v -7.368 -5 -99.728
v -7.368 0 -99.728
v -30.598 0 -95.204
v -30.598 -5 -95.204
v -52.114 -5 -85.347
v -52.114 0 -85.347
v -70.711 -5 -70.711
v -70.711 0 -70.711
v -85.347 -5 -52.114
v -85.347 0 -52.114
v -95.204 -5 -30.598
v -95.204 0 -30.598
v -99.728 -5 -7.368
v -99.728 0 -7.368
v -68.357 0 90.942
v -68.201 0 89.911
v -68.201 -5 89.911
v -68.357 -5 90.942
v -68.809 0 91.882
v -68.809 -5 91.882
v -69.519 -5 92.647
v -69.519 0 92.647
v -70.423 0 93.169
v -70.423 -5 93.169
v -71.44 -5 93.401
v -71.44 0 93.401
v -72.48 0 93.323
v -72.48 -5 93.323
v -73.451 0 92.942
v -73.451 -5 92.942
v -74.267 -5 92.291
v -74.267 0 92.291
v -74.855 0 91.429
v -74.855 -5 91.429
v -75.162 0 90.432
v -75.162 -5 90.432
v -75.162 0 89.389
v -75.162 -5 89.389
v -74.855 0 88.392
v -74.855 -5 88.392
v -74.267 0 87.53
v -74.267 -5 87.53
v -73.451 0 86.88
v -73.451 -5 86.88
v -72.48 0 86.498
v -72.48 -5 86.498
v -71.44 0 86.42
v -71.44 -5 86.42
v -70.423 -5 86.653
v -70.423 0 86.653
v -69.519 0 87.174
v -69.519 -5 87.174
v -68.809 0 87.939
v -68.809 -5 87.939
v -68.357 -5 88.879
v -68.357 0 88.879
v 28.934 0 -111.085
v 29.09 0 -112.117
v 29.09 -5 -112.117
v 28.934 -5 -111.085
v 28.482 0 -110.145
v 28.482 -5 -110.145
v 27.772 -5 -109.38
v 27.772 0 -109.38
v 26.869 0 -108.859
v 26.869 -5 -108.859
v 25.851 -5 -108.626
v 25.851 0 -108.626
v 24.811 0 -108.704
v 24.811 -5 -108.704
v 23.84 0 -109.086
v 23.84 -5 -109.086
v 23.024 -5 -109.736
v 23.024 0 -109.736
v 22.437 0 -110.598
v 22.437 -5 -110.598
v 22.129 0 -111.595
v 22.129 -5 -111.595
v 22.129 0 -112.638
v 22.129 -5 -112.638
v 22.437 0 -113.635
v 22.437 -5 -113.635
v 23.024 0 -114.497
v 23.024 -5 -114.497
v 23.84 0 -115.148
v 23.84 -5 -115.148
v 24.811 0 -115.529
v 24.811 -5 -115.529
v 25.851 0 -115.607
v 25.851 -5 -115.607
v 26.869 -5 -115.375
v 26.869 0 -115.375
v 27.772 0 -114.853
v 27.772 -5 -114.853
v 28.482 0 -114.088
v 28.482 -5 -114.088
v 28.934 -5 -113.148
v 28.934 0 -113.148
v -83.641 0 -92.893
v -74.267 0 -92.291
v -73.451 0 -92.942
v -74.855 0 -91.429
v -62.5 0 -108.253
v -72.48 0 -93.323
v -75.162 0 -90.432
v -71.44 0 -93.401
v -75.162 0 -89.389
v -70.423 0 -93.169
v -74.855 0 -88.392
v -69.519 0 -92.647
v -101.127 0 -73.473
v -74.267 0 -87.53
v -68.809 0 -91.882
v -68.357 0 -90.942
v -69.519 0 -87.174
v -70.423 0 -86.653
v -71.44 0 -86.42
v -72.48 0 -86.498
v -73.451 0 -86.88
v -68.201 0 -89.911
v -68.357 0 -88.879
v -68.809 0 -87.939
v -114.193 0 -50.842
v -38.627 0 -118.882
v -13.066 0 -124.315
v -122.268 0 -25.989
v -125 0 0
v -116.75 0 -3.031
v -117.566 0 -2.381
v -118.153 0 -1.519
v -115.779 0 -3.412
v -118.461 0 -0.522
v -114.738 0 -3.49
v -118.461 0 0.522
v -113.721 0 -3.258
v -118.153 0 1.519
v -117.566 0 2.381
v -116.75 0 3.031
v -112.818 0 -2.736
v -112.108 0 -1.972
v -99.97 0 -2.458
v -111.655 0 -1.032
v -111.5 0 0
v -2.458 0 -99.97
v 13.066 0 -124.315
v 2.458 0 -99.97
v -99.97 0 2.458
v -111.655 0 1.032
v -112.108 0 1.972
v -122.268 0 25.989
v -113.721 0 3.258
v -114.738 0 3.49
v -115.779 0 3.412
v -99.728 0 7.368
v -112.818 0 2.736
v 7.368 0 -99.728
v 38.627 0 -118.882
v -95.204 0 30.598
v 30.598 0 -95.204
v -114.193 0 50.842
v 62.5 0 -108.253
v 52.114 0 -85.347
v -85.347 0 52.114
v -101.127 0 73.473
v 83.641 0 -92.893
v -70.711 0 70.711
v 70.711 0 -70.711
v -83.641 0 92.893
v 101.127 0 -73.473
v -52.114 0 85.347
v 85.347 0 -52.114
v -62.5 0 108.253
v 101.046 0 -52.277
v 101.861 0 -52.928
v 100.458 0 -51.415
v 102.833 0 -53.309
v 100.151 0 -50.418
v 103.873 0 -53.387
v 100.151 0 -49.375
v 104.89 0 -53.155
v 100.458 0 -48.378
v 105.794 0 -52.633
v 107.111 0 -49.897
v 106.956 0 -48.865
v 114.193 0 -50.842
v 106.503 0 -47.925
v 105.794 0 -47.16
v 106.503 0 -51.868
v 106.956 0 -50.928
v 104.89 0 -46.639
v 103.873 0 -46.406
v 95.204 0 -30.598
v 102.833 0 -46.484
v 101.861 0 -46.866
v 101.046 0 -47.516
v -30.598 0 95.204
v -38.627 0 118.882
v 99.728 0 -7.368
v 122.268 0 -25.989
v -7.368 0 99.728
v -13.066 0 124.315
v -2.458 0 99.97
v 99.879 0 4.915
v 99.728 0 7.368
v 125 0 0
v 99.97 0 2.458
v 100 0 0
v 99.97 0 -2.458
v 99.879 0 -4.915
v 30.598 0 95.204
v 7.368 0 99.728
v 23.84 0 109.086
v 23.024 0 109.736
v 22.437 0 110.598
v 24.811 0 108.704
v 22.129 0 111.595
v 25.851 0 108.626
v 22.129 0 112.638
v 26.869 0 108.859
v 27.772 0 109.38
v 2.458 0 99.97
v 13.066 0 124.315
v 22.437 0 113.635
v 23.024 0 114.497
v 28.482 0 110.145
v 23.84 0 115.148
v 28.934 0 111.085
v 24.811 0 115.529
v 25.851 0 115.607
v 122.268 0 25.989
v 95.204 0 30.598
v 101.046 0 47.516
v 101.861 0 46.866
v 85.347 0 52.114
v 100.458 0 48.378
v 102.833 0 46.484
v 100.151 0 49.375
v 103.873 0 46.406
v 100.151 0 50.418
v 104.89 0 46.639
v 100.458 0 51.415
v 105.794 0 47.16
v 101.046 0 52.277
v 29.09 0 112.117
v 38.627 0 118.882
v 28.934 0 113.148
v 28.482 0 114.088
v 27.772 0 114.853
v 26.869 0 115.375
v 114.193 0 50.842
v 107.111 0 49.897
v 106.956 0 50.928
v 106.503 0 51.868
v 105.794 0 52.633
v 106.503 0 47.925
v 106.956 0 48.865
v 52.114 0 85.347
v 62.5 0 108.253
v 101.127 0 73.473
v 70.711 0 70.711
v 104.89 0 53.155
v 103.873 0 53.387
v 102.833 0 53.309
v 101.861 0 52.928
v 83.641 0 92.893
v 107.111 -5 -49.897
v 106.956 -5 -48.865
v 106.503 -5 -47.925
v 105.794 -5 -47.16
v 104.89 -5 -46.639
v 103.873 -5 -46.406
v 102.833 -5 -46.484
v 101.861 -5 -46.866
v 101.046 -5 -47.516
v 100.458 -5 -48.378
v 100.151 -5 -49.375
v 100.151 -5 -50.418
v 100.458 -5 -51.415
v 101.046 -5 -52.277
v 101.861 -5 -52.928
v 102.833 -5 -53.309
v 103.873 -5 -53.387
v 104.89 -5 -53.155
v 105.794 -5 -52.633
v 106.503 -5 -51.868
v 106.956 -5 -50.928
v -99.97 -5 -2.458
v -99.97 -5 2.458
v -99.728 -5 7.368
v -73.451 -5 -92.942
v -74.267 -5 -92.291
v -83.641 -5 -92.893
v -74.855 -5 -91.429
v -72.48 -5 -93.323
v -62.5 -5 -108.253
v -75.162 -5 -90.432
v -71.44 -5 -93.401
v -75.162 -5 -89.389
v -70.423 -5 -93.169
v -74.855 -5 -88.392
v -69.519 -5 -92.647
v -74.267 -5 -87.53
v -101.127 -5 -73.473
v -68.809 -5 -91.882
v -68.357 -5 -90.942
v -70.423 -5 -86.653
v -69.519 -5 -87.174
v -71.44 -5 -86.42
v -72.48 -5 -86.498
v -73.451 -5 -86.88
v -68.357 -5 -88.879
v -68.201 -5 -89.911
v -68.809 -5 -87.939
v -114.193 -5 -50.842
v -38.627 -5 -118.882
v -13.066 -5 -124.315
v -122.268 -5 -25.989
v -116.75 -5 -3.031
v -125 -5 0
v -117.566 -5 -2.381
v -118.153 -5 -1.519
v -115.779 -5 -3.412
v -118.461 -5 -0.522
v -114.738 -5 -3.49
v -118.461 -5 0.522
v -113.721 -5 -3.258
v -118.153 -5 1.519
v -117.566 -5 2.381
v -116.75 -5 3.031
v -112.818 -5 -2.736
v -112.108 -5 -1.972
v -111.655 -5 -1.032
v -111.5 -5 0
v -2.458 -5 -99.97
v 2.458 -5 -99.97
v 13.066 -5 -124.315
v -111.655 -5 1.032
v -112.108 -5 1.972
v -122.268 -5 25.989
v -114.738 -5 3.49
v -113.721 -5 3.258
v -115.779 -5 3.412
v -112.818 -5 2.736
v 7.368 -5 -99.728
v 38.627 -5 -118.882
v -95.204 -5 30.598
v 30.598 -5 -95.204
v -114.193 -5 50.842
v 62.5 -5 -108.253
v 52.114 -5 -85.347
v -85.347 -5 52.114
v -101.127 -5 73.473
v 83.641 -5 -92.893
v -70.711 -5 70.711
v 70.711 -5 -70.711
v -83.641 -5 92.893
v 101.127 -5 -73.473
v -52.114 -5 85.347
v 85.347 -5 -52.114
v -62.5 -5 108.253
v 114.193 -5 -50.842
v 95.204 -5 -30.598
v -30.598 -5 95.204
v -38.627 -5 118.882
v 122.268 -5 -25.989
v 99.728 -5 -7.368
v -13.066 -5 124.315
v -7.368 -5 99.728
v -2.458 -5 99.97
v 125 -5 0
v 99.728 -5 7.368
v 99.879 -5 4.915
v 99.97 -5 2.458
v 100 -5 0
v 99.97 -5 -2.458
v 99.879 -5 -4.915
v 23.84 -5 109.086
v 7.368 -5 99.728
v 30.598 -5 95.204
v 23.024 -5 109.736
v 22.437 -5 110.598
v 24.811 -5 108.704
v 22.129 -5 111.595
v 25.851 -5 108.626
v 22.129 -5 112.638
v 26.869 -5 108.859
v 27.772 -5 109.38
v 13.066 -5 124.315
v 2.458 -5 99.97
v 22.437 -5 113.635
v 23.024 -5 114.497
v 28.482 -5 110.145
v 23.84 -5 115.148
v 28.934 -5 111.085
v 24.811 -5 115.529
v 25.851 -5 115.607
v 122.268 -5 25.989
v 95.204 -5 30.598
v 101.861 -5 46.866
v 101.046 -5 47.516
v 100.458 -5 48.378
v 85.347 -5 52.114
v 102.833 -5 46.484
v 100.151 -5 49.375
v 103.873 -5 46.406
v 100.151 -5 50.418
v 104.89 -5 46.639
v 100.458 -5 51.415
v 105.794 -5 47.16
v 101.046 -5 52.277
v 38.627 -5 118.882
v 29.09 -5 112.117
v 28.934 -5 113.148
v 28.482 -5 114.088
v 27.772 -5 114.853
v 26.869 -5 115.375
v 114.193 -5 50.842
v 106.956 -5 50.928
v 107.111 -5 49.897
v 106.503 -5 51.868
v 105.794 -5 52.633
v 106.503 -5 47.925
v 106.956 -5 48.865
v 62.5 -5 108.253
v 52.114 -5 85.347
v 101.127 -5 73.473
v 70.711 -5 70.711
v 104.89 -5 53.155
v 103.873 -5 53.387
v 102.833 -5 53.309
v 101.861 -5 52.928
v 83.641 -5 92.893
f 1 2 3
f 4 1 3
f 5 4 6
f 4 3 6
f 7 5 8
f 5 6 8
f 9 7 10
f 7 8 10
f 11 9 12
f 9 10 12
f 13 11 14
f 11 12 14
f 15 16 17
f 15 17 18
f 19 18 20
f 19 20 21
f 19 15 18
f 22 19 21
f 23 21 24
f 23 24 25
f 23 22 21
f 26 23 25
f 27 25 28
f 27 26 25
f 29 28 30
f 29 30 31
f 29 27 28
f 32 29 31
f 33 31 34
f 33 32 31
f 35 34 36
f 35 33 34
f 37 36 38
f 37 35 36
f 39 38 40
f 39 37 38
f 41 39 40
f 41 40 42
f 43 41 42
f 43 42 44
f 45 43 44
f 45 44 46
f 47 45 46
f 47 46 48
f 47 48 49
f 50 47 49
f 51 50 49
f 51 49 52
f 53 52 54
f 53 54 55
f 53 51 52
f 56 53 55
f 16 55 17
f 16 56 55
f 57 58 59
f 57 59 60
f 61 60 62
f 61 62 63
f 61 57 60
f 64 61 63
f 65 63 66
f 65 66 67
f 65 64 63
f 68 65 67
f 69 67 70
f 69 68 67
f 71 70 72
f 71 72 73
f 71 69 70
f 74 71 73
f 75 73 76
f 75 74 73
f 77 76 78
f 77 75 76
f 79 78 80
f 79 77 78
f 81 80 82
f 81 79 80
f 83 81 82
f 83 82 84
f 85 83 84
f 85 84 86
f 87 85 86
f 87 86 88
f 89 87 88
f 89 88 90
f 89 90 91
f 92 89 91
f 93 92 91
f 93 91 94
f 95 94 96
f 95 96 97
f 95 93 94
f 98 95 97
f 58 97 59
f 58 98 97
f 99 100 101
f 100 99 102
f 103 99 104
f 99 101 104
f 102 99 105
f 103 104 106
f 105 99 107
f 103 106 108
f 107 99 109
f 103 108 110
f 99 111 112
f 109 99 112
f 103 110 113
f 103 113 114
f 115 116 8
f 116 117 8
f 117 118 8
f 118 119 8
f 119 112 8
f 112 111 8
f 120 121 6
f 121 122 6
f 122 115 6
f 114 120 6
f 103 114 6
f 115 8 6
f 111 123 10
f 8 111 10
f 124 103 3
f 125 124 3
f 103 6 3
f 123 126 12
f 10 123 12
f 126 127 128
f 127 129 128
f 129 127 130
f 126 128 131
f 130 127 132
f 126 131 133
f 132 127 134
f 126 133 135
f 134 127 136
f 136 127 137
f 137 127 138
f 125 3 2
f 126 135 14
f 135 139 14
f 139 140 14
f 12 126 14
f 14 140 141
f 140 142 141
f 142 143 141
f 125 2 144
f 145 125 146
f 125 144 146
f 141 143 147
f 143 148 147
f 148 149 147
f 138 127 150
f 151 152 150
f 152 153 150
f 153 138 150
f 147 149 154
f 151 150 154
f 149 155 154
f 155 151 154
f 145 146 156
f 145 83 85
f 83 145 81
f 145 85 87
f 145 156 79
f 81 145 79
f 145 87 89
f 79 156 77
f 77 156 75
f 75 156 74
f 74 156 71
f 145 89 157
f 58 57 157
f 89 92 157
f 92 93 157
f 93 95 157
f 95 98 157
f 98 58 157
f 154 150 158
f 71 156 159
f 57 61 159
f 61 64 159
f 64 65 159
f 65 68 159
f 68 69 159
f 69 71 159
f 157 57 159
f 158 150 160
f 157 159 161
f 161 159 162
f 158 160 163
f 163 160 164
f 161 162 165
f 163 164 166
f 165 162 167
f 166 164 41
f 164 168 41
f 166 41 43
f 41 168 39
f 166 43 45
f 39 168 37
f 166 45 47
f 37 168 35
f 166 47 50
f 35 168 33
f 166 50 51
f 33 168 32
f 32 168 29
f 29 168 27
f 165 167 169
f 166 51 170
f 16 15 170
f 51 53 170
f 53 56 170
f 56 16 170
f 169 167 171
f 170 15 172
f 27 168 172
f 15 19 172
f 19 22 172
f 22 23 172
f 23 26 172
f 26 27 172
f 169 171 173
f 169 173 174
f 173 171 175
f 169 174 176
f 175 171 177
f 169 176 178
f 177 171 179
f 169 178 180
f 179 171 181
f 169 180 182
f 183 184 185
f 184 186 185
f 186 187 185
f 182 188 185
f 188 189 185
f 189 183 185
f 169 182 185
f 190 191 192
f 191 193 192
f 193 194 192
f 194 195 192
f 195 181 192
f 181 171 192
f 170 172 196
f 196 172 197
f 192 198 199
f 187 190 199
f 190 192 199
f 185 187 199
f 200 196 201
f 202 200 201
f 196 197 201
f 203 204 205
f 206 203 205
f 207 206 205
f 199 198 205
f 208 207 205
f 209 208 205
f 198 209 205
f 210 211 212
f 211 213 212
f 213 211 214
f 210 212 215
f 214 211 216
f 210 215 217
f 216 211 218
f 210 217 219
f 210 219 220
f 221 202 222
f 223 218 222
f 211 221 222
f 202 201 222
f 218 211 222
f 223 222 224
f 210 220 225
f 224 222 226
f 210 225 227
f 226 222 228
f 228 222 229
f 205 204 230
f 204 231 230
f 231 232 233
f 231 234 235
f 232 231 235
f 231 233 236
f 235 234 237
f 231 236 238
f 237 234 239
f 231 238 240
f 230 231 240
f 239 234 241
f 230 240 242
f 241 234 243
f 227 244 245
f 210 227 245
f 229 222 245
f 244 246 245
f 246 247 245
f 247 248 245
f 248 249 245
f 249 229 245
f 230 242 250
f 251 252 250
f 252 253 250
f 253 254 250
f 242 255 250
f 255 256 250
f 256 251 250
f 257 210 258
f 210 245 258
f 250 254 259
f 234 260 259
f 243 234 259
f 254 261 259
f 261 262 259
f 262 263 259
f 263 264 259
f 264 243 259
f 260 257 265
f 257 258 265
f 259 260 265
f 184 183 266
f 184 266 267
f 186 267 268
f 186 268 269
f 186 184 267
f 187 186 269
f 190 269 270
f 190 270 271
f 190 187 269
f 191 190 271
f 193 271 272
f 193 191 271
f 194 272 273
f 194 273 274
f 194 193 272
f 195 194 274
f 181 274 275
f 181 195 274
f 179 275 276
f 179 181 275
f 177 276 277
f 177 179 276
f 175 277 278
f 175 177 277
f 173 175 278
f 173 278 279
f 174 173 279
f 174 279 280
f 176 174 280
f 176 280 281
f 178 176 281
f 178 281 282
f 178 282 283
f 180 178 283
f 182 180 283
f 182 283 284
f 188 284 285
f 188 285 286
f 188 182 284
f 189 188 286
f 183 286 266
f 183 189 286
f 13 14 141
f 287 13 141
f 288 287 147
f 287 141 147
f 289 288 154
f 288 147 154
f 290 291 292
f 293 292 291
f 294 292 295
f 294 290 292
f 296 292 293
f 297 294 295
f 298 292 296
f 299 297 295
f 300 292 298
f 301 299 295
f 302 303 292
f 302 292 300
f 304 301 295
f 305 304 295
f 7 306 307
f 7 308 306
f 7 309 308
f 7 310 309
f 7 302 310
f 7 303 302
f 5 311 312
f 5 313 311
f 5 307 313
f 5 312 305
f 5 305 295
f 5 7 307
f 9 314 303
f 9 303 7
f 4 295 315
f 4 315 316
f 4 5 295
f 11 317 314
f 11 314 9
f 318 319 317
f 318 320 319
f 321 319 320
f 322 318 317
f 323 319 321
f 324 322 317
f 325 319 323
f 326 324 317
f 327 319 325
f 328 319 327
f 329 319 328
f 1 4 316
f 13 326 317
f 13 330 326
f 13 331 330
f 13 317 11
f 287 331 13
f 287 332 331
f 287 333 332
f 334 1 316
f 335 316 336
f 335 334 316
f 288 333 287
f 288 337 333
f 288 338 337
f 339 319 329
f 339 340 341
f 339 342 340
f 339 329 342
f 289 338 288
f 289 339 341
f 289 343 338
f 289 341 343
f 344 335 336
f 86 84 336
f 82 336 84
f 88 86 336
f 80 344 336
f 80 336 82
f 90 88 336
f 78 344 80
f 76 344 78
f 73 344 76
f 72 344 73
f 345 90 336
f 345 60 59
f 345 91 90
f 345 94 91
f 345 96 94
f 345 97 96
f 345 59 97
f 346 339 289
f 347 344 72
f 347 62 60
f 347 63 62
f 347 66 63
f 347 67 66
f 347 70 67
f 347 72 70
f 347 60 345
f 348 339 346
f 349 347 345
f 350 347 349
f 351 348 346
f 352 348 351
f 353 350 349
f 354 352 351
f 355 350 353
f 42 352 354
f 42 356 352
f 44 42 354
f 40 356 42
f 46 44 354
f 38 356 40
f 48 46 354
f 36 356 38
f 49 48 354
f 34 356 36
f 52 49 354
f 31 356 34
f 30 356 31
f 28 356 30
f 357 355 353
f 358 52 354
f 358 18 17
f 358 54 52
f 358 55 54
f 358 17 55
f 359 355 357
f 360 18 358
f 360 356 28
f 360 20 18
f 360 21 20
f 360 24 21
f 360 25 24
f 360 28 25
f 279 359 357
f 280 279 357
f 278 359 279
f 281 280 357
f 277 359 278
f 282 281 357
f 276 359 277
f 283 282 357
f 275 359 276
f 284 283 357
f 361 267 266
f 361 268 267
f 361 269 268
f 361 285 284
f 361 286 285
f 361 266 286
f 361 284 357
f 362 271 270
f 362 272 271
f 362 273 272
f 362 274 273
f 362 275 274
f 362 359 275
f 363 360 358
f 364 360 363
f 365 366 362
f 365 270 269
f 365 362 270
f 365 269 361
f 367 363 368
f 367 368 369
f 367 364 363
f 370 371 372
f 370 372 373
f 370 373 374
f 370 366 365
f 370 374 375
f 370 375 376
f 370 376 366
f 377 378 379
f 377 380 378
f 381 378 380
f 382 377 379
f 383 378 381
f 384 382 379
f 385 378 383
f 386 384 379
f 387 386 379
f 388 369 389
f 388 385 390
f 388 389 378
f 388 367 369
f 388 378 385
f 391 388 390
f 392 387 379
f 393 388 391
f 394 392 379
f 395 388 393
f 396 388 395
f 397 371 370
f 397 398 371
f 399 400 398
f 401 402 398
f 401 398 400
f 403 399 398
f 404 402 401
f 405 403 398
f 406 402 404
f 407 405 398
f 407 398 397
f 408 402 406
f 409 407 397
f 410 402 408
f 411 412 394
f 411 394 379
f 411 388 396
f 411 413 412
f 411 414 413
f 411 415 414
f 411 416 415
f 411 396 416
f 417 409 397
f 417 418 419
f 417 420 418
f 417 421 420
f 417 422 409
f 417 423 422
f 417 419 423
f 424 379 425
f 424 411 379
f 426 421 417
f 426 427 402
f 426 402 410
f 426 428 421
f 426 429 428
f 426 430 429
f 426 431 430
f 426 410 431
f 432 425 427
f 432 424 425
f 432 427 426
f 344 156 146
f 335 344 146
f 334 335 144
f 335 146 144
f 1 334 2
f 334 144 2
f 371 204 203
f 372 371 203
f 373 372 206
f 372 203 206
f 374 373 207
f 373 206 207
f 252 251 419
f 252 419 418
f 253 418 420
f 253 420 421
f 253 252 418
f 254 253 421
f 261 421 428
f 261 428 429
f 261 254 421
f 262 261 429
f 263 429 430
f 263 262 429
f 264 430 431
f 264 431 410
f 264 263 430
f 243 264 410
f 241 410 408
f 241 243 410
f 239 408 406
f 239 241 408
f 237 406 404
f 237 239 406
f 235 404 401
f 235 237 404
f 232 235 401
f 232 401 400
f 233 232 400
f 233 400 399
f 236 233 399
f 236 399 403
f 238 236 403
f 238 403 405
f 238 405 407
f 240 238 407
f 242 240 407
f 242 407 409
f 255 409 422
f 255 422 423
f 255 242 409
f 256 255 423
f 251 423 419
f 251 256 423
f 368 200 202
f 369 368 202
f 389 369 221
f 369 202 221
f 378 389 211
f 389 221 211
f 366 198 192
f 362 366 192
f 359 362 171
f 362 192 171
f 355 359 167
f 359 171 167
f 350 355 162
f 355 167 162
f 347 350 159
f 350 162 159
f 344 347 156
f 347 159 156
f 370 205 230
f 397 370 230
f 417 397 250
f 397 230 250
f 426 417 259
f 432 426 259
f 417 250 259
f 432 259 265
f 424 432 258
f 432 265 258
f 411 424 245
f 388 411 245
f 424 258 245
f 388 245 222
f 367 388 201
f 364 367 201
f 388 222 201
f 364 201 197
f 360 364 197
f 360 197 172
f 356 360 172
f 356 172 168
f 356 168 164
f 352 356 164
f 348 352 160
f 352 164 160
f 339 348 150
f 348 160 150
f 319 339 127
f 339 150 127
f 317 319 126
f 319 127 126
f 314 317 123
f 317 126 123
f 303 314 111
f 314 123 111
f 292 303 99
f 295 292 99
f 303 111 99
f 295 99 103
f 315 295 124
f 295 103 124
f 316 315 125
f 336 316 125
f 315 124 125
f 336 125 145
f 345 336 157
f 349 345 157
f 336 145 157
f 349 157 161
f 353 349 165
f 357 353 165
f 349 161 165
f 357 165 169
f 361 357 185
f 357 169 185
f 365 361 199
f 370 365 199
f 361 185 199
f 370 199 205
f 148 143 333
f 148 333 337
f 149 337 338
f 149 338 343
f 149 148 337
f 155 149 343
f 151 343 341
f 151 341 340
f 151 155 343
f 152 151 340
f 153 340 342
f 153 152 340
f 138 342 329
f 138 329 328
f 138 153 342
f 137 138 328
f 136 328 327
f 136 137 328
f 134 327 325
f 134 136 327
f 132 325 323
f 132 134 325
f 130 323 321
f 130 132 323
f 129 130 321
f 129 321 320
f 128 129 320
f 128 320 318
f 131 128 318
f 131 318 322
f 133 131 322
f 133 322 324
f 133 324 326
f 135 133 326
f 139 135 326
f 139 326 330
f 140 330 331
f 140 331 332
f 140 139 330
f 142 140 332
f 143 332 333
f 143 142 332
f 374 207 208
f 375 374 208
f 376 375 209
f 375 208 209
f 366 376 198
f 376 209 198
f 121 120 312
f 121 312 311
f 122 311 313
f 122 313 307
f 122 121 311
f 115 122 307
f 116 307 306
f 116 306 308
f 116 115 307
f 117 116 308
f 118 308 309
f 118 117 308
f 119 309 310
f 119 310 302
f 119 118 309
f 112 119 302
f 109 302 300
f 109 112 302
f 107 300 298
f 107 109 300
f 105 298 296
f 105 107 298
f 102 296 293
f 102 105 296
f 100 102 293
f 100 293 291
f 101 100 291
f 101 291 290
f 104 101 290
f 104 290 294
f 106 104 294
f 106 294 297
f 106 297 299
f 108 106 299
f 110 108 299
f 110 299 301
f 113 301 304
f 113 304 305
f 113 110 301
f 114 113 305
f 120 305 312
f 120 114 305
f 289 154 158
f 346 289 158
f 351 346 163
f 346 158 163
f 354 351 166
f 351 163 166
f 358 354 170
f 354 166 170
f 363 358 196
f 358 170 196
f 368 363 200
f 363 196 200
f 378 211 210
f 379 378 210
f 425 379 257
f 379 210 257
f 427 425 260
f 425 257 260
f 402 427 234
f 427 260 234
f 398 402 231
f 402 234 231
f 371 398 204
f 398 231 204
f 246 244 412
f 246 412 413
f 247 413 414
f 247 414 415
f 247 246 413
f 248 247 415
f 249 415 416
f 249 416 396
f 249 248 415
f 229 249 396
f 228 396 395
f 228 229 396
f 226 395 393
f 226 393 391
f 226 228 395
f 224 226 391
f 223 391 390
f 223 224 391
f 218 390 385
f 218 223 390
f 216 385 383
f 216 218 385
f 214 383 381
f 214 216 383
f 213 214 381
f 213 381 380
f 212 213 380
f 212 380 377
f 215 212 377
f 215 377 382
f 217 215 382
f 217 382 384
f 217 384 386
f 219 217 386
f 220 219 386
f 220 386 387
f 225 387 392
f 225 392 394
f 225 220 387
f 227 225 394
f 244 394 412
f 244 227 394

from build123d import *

# Parameters (mm, degrees)
F0_R     = 125
F0_R_2   = 3.5
F1_DEPTH = 5


with BuildPart() as f1:
    # F0 (on Front) → F1 (new body)
    with BuildSketch(Plane.XZ):
        Circle(F0_R)
        with Locations((-71.701327, -89.91062)):
            Circle(F0_R_2, mode=Mode.SUBTRACT)
        with Locations((25.589907, -112.11671)):
            Circle(F0_R_2, mode=Mode.SUBTRACT)
        with Locations((103.61142, -49.89663)):
            Circle(F0_R_2, mode=Mode.SUBTRACT)
        with Locations((-115, 0)):
            Circle(F0_R_2, mode=Mode.SUBTRACT)
        with Locations((-71.701327, 89.91062)):
            Circle(F0_R_2, mode=Mode.SUBTRACT)
        with BuildLine():
            ThreePointArc((-99.728162, 7.368421), (-70.710678, 70.710678), (-7.368421, 99.728162))
            ThreePointArc((-7.368421, 99.728162), (0, 100), (7.368421, 99.728162))
            ThreePointArc((7.368421, 99.728162), (70.710678, 70.710678), (99.728162, 7.368421))
            ThreePointArc((99.728162, 7.368421), (99.932017, 3.686717), (100, 0))
            ThreePointArc((100, 0), (99.932017, -3.686717), (99.728162, -7.368421))
            ThreePointArc((99.728162, -7.368421), (70.710678, -70.710678), (7.368421, -99.728162))
            ThreePointArc((7.368421, -99.728162), (0, -100), (-7.368421, -99.728162))
            ThreePointArc((-7.368421, -99.728162), (-70.710678, -70.710678), (-99.728162, -7.368421))
            ThreePointArc((-99.728162, -7.368421), (-100, 0), (-99.728162, 7.368421))
        make_face(mode=Mode.SUBTRACT)
        with Locations((103.61142, 49.89663)):
            Circle(F0_R_2, mode=Mode.SUBTRACT)
        with Locations((25.589907, 112.11671)):
            Circle(F0_R_2, mode=Mode.SUBTRACT)
    extrude(amount=F1_DEPTH)


solid = f1.part
